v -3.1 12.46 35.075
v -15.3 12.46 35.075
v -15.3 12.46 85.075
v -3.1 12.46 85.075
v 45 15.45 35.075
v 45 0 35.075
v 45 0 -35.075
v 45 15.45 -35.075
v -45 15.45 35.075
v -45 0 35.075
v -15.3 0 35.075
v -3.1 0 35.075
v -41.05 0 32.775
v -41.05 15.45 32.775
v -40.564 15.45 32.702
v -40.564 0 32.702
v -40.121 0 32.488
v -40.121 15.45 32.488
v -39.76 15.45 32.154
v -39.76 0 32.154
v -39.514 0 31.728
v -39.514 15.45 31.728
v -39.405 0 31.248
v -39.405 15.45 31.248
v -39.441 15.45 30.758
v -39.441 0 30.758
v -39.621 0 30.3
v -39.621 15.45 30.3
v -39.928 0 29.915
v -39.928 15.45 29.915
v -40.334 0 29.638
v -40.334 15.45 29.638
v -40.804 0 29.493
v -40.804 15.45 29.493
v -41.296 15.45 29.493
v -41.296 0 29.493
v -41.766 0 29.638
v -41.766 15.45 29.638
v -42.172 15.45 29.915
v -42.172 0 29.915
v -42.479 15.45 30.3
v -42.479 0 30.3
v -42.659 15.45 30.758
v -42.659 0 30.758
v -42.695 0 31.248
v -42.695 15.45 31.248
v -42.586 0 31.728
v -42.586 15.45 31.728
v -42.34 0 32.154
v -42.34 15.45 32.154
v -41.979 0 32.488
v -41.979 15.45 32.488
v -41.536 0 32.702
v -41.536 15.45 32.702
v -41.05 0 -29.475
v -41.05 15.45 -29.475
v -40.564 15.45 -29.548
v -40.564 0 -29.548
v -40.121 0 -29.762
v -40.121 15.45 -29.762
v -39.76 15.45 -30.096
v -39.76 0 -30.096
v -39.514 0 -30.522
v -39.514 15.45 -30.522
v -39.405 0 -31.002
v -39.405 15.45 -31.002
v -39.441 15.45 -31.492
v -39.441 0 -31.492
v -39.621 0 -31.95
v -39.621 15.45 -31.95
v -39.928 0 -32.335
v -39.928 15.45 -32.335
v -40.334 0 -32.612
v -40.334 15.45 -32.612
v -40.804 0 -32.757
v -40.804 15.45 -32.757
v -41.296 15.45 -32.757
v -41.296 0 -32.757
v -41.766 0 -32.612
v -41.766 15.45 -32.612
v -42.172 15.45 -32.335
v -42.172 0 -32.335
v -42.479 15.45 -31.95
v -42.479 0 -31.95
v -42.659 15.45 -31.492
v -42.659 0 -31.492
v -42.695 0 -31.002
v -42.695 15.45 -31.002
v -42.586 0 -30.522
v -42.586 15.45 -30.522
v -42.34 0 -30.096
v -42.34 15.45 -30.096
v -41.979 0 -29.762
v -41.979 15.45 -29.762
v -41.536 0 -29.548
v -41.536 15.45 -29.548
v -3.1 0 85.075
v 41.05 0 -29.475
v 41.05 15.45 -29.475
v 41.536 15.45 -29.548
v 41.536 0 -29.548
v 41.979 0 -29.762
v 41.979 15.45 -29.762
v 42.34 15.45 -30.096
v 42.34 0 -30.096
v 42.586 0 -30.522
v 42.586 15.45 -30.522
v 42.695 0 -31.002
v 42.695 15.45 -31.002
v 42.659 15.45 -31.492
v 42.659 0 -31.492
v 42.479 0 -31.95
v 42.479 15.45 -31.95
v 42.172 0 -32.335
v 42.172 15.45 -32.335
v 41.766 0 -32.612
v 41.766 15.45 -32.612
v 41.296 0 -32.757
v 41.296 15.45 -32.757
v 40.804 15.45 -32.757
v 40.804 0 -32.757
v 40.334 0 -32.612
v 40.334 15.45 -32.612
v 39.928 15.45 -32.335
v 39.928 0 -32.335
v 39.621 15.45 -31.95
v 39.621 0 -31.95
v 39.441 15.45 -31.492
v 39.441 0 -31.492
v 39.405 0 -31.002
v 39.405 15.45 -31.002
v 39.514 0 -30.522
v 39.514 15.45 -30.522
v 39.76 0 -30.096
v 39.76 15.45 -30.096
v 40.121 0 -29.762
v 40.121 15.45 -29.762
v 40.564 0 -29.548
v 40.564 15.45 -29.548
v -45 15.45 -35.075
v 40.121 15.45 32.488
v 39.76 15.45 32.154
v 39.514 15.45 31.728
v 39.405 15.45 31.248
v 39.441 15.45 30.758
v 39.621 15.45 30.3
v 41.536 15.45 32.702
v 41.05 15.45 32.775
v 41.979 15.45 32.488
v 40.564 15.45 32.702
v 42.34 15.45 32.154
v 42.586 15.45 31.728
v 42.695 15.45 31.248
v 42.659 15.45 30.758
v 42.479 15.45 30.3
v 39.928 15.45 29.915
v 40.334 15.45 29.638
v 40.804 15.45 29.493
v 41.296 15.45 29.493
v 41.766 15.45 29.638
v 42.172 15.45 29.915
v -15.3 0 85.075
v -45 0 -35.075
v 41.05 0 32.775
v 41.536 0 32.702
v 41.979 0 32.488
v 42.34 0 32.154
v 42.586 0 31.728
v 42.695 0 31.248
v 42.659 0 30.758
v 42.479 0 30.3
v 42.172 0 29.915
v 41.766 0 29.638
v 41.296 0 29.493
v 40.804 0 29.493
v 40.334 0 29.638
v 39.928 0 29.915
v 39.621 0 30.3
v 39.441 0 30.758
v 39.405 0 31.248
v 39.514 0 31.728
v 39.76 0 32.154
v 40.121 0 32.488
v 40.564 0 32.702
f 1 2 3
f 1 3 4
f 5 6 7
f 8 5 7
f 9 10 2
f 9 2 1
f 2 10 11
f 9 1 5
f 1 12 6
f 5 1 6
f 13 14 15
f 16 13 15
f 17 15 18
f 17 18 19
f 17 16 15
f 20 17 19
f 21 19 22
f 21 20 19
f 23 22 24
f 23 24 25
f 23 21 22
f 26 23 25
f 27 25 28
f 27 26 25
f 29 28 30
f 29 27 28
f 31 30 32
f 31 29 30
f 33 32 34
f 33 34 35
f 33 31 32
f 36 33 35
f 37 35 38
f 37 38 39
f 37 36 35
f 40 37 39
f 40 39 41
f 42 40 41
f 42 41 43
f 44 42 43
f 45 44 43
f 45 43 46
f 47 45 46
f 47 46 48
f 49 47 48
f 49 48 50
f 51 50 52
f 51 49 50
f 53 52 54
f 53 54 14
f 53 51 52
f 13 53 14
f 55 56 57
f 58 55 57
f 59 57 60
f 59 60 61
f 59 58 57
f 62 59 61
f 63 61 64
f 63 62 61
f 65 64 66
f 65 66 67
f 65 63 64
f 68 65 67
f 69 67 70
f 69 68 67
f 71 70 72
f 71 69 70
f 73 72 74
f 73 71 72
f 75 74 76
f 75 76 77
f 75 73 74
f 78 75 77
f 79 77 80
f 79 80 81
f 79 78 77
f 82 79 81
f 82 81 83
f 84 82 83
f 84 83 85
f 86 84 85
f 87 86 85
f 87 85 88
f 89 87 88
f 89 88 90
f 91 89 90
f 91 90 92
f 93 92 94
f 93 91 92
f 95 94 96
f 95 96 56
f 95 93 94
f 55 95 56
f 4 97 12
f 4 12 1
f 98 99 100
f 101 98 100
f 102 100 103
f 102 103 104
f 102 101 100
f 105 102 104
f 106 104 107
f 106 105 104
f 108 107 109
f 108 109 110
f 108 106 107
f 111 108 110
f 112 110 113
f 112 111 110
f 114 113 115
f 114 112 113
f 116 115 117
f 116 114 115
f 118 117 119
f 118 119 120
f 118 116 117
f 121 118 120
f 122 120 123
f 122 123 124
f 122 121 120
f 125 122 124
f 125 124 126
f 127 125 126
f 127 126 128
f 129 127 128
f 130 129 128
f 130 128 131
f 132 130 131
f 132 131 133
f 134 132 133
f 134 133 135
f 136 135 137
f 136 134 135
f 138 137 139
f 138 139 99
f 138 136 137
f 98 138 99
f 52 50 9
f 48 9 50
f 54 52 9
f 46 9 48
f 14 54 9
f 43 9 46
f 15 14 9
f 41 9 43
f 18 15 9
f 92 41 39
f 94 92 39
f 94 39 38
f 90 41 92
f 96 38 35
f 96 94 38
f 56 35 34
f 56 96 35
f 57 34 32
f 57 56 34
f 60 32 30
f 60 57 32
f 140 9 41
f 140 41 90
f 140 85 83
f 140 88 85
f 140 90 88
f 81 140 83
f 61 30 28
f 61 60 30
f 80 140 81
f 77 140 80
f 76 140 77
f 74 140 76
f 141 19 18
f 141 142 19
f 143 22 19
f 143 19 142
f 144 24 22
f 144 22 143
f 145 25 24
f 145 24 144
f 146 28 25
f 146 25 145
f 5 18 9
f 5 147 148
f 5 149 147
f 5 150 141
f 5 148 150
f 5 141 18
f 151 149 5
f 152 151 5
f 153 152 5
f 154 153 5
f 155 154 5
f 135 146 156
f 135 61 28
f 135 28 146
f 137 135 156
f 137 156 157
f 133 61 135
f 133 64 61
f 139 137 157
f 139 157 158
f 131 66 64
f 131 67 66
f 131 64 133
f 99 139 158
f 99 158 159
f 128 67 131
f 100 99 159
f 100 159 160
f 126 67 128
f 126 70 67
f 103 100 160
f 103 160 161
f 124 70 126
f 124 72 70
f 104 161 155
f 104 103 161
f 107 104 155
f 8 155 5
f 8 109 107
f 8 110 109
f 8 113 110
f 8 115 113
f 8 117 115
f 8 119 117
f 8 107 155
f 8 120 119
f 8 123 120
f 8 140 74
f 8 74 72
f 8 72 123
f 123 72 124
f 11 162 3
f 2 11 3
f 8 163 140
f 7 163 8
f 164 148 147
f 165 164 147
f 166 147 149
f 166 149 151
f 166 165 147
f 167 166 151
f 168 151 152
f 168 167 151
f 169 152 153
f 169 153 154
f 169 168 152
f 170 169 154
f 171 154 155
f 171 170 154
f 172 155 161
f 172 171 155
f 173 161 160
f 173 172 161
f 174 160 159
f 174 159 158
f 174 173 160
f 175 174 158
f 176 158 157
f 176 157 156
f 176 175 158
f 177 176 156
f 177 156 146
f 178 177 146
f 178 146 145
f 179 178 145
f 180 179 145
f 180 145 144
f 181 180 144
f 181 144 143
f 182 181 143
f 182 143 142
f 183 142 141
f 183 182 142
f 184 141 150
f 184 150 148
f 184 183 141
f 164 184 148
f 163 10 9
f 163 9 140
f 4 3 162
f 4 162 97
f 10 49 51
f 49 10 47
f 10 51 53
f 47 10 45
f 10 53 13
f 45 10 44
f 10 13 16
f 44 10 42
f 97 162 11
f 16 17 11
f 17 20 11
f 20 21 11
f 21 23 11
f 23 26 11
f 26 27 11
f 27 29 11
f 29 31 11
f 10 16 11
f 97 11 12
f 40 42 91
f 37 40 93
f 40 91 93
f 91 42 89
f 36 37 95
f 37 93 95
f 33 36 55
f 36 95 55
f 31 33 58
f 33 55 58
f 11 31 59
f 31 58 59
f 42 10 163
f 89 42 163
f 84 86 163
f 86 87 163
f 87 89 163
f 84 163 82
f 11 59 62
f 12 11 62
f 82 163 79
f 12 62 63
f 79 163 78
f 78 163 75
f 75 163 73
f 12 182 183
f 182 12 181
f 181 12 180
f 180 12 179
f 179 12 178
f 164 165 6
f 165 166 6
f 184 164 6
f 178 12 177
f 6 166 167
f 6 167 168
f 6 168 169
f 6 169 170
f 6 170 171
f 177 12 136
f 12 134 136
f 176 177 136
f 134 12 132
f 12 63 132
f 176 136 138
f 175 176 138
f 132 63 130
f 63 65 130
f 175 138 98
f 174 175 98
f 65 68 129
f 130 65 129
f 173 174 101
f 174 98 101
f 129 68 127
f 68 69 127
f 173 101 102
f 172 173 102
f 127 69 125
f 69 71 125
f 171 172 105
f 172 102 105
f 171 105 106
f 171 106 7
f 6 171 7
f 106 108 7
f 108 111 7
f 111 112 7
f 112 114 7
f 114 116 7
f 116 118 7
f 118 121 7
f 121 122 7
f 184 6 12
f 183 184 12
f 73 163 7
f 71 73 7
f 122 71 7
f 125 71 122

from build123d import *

# Parameters (mm, degrees)
SKETCH1_W           = 90
SKETCH1_H           = 70.15
SKETCH1_R           = 1.65
BOSS_EXTRUDE1_DEPTH = 15.45
SKETCH2_W           = 12.2
SKETCH2_H           = 12.46
BOSS_EXTRUDE2_DEPTH = 50


with BuildPart() as part:
    # Sketch1 → Boss-Extrude1 (new body)
    with BuildSketch(Plane(origin=(0, 0, 0), x_dir=(1, 0, 0), z_dir=(0, 1, 0))):
        Rectangle(SKETCH1_W, SKETCH1_H)
        with Locations(Location((-41.05, 31.125, 0), (0, 0, 270))):
            Circle(SKETCH1_R, mode=Mode.SUBTRACT)
        with Locations(Location((41.05, 31.125, 0), (0, 0, 270))):
            Circle(SKETCH1_R, mode=Mode.SUBTRACT)
        with Locations(Location((-41.05, -31.125, 0), (0, 0, 270))):
            Circle(SKETCH1_R, mode=Mode.SUBTRACT)
        with Locations(Location((41.05, -31.125, 0), (0, 0, 270))):
            Circle(SKETCH1_R, mode=Mode.SUBTRACT)
    extrude(amount=BOSS_EXTRUDE1_DEPTH)

    # Sketch2 → Boss-Extrude2 (add)
    with BuildSketch(Plane.XY.offset(35.075)):
        with Locations((-9.2, 6.23)):
            Rectangle(SKETCH2_W, SKETCH2_H)
    extrude(amount=BOSS_EXTRUDE2_DEPTH)


solid = part.part
